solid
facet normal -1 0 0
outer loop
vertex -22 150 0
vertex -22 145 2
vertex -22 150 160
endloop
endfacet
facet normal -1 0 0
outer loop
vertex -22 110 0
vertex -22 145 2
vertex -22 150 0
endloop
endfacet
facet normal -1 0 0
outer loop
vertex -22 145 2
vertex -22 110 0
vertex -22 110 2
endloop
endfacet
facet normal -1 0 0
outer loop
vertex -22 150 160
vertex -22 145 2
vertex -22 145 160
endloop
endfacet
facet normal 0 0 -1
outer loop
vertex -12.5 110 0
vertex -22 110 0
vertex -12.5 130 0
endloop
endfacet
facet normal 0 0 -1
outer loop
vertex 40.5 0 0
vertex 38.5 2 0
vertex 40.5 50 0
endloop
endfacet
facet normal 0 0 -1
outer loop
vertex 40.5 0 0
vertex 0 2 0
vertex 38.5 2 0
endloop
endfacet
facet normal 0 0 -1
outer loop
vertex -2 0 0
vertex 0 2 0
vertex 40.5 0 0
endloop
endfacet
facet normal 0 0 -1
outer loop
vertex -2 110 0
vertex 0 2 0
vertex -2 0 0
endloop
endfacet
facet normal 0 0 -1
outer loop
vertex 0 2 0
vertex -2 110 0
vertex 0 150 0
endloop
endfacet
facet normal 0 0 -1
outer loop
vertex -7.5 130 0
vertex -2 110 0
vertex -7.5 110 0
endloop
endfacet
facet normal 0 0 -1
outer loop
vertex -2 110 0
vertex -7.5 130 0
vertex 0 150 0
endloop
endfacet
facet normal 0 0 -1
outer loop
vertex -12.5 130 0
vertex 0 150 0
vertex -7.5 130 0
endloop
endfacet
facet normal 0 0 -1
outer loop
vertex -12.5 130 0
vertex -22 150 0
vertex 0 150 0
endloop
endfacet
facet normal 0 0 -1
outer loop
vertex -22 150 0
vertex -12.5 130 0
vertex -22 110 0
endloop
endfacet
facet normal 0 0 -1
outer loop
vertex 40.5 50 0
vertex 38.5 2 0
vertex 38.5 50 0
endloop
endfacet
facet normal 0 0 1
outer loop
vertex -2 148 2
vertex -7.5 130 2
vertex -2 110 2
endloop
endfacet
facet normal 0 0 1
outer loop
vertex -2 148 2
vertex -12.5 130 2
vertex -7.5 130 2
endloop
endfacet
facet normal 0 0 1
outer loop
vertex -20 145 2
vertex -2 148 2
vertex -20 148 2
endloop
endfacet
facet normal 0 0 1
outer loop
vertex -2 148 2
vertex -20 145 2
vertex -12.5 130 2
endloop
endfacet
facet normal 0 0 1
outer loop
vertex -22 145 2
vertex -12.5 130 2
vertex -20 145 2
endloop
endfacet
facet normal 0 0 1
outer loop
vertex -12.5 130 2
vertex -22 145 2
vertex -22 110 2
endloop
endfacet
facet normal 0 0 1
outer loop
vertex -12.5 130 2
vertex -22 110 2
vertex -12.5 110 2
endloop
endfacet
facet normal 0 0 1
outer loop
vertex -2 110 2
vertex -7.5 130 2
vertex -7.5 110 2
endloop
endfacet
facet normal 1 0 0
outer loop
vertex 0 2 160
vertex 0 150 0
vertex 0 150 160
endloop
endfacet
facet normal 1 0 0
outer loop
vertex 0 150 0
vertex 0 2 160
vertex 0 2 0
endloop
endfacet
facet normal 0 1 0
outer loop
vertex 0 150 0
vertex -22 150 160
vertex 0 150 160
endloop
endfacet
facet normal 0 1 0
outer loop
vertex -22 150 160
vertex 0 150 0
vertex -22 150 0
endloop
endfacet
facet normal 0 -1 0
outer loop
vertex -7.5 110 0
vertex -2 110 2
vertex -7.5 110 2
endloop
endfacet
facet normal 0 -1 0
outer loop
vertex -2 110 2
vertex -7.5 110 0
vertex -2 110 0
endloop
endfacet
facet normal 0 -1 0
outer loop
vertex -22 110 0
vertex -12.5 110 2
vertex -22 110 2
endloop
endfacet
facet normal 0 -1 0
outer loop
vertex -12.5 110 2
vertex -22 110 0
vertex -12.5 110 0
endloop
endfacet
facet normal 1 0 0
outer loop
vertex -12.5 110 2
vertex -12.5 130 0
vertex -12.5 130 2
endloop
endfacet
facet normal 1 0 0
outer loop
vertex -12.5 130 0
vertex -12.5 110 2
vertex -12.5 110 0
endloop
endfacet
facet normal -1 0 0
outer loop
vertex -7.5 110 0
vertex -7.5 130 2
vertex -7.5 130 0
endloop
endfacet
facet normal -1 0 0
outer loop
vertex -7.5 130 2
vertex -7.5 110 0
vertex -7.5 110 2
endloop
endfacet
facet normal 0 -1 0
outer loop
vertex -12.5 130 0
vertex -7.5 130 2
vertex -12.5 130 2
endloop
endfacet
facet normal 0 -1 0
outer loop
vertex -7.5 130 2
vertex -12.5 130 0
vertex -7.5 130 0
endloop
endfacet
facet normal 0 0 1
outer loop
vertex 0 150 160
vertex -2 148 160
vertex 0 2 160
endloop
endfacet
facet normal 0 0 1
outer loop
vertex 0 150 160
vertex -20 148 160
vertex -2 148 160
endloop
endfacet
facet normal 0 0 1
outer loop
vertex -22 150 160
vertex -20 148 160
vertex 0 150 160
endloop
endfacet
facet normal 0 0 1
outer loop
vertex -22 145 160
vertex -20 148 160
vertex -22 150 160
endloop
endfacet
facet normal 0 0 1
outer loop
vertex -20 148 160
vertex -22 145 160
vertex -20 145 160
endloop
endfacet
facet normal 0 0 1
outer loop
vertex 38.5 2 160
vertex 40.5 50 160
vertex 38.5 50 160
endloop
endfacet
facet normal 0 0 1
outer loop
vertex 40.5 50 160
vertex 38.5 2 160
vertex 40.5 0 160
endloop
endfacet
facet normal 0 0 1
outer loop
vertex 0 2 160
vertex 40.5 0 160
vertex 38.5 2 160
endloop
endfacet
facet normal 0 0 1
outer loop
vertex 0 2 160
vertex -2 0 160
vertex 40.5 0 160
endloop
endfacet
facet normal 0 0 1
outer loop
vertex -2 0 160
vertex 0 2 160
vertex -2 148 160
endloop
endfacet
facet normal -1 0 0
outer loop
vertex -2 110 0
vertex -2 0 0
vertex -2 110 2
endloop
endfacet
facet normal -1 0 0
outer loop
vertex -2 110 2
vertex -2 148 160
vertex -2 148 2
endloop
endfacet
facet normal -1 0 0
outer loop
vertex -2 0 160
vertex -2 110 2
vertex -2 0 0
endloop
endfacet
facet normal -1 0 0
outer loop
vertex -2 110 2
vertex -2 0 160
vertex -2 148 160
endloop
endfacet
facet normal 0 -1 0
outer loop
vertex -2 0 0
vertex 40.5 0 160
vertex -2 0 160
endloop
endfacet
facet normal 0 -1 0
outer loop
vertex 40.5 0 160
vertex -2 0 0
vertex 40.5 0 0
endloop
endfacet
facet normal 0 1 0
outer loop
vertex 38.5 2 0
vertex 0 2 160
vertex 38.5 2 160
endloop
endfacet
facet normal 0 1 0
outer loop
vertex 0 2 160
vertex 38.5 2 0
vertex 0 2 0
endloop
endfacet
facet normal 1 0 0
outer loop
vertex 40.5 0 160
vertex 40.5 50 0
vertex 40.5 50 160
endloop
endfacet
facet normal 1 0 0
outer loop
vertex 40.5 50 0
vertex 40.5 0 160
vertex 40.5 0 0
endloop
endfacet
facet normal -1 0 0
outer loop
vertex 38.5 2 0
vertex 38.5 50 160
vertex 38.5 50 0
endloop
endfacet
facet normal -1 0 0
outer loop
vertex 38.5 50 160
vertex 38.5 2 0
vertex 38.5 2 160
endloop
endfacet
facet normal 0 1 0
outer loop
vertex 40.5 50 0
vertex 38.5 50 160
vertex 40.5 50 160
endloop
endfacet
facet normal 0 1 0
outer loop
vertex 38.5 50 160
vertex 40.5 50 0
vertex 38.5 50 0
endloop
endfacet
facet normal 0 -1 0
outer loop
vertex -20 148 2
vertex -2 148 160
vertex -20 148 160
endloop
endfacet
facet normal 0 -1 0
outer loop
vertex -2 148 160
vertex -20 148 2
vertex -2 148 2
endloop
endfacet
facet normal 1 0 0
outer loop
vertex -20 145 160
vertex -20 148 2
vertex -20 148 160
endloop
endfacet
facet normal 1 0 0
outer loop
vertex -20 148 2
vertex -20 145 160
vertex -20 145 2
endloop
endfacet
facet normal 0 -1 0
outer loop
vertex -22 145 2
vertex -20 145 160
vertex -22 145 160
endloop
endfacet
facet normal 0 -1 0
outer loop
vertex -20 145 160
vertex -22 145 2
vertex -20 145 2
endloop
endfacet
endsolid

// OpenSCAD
rotate([0, -90, 0]){
    cube([160, 150, 2]);

    translate([0, 2, -40.5])
        rotate([90, 0, 0])
            cube([160, 40.5, 2]);
            
    translate([0, 0, -40.5])
        cube([160, 50, 2]);
        
    translate([0, 150, 0])
        rotate([90, 0, 0])
            cube([160, 20, 2]);
            
    translate([0, 145, 20])
        cube([160, 5, 2]);

    translate([2, 110, 0]) {    
        rotate([0, -90, 0]) {
            difference() {
                cube([22, 40, 2]);
                translate([7.5, 0, 0])              cube([5, 20, 2]);
            }
        }
    }

}
